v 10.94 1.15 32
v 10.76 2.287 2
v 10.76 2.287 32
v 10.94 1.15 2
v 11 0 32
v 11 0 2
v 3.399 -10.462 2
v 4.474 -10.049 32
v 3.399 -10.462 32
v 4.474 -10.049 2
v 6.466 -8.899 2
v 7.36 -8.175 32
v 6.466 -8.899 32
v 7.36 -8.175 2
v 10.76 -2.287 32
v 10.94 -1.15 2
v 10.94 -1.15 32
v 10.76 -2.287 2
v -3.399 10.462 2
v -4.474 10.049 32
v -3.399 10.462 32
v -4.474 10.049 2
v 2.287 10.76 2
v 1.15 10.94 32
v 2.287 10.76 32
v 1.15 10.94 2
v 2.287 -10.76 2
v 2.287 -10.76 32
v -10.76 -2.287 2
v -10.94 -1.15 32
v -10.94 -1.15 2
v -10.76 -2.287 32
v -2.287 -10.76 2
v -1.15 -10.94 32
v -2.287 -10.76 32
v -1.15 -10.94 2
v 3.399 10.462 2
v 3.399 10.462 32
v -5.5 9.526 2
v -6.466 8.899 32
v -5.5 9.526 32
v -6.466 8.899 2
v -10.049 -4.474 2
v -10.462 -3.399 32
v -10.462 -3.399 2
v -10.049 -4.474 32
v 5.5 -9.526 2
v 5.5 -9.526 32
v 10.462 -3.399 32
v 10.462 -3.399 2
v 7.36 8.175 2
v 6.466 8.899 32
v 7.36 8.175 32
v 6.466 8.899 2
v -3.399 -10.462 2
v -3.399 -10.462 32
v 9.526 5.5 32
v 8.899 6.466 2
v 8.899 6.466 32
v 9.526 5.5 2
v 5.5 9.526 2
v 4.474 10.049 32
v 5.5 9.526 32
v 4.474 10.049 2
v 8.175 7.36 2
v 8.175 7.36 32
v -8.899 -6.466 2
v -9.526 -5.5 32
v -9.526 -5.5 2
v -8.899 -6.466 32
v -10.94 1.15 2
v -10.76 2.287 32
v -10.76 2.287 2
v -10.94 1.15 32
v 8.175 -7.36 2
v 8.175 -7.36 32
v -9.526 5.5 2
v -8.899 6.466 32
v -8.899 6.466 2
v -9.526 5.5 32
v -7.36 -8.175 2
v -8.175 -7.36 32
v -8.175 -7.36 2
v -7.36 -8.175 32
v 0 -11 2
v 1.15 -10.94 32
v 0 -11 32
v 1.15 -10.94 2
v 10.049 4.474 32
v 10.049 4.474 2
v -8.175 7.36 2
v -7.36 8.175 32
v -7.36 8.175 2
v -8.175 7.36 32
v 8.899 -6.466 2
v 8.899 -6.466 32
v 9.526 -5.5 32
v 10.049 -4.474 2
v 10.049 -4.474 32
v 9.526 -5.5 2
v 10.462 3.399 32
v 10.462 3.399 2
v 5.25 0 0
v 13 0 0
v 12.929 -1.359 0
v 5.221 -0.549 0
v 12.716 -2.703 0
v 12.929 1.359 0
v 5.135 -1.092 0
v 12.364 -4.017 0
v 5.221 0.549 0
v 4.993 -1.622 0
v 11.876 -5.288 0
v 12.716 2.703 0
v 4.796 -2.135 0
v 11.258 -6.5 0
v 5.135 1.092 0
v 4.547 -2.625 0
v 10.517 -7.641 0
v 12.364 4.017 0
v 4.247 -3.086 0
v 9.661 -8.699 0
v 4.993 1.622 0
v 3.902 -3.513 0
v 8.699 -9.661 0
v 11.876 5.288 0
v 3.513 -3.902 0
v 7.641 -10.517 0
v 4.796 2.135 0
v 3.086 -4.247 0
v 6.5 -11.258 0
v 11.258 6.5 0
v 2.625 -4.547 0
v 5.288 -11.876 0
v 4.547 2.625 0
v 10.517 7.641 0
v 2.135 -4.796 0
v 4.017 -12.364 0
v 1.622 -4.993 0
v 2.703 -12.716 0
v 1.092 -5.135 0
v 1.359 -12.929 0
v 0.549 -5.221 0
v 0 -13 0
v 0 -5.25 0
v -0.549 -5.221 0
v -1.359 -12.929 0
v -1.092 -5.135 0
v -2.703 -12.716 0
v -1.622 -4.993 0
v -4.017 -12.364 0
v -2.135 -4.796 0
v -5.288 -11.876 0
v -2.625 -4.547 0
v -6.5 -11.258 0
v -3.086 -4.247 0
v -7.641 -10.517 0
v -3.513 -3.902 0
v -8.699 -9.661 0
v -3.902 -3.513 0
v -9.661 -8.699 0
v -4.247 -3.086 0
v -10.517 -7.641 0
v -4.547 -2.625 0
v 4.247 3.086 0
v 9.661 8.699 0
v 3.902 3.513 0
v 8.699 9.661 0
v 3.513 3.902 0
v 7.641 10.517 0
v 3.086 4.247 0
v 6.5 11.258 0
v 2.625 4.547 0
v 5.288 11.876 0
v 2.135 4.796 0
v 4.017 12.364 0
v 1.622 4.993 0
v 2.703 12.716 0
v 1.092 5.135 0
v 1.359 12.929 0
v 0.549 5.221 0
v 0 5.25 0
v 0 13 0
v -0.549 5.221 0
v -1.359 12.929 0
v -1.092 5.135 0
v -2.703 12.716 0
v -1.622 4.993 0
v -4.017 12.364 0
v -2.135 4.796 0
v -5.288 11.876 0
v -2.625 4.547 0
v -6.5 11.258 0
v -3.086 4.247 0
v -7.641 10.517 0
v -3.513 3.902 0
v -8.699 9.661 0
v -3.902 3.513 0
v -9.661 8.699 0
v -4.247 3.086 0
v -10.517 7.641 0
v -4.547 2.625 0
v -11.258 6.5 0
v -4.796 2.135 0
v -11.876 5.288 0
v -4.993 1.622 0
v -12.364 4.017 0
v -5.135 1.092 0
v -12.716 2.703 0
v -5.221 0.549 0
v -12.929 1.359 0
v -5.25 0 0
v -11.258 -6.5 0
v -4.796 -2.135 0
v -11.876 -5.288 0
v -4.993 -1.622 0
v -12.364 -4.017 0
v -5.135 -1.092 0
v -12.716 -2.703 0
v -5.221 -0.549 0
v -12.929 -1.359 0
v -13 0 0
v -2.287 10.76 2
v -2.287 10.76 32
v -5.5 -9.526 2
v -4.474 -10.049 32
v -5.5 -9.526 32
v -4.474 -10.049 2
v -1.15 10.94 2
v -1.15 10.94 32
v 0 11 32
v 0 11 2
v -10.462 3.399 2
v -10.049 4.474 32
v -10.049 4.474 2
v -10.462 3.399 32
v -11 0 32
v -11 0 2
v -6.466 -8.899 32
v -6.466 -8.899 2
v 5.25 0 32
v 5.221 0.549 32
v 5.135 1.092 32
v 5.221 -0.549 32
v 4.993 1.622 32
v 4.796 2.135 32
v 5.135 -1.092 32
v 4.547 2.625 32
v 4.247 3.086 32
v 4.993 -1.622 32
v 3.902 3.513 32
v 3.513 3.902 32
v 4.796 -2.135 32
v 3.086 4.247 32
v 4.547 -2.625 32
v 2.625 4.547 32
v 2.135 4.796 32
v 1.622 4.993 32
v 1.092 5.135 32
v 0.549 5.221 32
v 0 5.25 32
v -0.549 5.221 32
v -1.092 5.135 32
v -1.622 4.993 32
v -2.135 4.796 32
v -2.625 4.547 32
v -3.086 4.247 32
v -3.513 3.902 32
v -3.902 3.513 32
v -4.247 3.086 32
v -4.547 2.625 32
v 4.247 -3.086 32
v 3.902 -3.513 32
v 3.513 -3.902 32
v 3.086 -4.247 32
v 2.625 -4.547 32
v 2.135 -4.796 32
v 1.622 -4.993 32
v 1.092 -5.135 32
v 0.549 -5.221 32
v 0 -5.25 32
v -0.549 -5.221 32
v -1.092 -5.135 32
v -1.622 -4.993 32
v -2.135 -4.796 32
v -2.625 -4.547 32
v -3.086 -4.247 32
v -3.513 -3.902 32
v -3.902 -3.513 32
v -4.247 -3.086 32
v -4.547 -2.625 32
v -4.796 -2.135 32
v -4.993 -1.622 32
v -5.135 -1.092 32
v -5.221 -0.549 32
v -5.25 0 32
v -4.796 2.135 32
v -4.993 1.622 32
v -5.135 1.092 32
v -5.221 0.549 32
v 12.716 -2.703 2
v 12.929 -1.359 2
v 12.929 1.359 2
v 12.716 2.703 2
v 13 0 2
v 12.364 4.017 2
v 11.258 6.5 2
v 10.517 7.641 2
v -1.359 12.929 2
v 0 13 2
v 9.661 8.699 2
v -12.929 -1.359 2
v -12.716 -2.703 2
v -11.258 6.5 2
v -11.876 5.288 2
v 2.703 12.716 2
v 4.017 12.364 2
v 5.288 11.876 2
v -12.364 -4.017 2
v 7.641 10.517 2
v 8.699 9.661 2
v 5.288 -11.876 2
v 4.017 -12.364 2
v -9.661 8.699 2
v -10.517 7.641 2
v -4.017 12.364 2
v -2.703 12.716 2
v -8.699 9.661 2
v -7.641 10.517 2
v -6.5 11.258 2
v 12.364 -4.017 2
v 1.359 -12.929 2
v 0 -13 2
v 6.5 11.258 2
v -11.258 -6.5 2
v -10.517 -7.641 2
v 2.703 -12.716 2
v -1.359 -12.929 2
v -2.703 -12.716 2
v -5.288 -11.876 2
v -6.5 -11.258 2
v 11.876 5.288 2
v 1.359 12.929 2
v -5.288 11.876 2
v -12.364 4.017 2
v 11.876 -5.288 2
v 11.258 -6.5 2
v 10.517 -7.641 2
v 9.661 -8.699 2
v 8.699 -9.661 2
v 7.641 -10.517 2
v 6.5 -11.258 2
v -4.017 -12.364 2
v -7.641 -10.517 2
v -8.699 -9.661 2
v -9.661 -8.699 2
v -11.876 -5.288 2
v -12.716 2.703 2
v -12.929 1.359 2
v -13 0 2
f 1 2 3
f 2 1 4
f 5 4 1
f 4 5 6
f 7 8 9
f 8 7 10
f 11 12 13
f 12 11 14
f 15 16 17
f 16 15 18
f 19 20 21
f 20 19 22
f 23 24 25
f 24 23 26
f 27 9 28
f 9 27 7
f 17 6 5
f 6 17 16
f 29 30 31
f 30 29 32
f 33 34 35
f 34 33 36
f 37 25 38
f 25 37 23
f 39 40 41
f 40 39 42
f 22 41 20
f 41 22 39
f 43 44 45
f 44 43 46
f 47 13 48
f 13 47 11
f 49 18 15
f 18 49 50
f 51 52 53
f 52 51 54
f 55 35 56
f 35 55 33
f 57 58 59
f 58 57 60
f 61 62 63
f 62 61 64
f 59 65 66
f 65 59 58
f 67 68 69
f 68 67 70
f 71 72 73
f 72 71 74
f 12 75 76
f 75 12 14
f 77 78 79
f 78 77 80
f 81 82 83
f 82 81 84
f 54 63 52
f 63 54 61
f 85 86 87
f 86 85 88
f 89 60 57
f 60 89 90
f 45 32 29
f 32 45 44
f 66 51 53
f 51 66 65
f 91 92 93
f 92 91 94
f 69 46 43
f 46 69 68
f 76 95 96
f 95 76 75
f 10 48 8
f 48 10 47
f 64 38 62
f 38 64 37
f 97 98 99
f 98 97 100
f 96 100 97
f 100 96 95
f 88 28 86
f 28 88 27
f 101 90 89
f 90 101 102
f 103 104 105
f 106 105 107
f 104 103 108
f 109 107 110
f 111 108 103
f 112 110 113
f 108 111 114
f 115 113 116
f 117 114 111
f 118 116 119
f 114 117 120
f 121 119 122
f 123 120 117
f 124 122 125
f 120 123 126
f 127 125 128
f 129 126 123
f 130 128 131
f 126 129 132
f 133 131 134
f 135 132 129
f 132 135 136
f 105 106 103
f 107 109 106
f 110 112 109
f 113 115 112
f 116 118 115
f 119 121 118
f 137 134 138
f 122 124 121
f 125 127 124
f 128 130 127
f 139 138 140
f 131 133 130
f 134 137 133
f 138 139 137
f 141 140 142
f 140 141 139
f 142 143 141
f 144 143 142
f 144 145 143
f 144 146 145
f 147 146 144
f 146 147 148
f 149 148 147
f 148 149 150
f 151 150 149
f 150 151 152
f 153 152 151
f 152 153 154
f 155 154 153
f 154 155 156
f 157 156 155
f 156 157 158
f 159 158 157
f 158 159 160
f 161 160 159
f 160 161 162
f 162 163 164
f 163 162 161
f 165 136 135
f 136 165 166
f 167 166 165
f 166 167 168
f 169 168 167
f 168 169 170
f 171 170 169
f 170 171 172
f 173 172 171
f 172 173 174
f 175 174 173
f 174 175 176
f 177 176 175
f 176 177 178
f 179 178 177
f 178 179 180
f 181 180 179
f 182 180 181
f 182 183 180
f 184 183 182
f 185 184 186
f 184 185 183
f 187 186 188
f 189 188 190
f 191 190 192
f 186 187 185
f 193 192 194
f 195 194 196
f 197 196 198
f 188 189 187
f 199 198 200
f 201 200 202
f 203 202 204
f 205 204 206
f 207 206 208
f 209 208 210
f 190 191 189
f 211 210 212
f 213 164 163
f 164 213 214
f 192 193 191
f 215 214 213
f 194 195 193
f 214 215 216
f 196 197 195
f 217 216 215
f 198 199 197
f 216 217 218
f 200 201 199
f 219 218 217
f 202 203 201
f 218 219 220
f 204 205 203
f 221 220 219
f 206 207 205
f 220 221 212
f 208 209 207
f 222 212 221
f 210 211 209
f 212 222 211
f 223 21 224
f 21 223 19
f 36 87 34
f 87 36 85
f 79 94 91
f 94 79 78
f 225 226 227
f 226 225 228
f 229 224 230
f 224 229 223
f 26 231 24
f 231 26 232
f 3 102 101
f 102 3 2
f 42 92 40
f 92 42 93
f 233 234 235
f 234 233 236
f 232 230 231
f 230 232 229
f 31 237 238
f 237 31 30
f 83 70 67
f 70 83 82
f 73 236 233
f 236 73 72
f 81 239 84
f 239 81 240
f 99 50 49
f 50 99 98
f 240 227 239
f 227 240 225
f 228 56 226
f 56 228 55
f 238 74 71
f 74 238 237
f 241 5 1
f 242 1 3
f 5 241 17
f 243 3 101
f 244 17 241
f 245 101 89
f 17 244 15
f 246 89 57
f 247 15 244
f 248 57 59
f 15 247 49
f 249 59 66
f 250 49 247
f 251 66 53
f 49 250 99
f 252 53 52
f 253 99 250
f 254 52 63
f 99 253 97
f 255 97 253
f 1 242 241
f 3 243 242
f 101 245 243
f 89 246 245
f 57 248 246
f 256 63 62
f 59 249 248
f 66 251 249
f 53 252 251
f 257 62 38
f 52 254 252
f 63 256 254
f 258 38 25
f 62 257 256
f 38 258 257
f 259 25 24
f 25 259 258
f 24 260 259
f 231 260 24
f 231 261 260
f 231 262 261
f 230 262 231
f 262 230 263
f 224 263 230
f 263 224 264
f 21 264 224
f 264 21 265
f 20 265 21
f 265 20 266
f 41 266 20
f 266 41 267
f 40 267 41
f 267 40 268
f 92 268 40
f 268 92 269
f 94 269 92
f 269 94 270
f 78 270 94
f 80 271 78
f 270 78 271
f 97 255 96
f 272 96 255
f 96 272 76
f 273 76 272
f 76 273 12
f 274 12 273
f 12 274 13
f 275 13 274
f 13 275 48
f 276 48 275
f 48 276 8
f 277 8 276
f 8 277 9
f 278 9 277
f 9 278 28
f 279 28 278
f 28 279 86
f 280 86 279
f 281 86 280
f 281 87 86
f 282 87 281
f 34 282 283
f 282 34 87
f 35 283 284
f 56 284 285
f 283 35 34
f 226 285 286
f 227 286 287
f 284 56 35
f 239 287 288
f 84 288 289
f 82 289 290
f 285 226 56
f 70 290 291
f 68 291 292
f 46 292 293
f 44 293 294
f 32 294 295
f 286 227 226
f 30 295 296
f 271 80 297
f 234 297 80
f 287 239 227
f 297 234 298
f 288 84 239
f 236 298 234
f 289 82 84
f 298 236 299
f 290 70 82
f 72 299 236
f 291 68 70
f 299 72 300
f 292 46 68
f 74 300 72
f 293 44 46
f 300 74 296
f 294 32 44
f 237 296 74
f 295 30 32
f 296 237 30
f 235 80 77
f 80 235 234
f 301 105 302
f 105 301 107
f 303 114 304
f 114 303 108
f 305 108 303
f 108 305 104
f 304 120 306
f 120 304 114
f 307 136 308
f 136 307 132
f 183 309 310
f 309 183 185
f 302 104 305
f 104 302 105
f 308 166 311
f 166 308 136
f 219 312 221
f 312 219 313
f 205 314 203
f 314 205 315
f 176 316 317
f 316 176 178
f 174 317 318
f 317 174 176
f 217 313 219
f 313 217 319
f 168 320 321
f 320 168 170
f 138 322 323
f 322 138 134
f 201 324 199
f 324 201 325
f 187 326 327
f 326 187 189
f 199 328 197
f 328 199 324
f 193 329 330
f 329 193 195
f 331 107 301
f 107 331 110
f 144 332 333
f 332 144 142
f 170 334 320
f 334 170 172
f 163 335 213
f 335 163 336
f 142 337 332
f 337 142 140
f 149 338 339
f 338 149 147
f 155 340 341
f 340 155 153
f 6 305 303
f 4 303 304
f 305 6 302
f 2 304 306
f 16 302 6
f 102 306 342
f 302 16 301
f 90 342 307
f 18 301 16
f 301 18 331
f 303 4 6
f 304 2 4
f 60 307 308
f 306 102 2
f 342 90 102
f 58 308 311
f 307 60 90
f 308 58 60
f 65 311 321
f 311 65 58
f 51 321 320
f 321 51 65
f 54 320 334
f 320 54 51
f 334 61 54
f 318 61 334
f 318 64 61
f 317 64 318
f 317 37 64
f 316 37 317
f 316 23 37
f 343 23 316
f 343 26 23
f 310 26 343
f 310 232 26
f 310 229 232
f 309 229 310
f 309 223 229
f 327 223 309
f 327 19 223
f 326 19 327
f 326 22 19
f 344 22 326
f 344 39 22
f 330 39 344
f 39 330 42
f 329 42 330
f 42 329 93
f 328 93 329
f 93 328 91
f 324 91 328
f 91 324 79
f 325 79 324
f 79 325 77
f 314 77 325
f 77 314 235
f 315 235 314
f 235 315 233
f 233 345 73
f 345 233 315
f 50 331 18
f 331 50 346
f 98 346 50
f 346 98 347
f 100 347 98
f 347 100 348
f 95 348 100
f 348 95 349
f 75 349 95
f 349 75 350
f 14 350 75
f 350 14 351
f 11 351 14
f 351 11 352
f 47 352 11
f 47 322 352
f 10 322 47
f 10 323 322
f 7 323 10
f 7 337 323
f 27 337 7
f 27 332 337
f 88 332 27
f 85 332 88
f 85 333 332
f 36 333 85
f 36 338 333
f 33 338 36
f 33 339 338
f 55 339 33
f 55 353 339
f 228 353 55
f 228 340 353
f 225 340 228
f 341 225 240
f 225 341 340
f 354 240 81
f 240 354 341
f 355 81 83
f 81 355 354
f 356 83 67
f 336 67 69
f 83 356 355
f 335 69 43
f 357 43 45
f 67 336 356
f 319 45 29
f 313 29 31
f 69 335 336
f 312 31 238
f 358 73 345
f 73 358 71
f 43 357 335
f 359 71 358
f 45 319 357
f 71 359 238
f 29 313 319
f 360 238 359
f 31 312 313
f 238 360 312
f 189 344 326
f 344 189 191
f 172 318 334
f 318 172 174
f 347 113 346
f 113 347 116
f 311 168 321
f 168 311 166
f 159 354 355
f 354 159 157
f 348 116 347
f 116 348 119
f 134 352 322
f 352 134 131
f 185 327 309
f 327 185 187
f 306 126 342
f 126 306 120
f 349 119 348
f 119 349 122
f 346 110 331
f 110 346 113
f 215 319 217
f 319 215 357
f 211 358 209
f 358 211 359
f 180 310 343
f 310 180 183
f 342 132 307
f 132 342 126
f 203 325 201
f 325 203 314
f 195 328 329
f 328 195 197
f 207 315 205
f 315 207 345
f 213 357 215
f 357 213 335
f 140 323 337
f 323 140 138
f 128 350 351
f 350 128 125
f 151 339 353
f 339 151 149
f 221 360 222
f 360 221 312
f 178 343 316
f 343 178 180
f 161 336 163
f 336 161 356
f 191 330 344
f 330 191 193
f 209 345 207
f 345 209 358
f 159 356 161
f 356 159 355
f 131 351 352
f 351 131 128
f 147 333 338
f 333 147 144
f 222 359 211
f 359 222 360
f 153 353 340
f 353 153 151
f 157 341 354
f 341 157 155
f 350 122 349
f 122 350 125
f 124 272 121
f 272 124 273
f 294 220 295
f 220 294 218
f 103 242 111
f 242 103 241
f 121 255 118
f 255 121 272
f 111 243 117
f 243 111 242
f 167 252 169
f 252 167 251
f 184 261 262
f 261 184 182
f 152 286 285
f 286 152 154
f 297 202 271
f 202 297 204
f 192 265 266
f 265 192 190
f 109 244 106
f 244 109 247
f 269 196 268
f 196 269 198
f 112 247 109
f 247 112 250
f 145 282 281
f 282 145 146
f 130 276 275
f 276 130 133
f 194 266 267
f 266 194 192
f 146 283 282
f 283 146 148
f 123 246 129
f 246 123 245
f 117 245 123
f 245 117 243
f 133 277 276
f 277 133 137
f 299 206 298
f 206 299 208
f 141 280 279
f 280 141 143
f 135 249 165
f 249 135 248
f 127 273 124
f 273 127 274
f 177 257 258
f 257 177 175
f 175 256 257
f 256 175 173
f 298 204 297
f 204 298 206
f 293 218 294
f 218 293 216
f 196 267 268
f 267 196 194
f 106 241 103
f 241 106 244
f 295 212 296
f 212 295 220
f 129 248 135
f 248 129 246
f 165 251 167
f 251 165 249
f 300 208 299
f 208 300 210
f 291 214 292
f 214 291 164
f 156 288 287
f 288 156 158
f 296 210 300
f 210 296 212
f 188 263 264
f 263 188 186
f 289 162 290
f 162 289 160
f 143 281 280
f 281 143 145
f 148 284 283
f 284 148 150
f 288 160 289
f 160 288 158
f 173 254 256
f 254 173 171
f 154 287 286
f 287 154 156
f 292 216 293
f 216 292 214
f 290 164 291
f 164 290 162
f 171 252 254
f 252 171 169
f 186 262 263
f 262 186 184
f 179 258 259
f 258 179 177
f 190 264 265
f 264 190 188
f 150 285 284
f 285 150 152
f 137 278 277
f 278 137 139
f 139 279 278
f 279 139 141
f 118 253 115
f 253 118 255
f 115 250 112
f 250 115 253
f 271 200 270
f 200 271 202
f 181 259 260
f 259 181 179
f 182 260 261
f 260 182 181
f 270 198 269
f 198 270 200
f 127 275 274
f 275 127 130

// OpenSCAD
// Motor mounting standoff.
$fn = 60;
eps = 0.02;
thread_d = 10.5;
outer_d = 22;
length = 32;
difference() {
    union() { cylinder(d=outer_d,h=length); cylinder(d=outer_d+4,h=2); }
    translate([0,0,-eps]) cylinder(d=thread_d,h=length+2*eps);
}
